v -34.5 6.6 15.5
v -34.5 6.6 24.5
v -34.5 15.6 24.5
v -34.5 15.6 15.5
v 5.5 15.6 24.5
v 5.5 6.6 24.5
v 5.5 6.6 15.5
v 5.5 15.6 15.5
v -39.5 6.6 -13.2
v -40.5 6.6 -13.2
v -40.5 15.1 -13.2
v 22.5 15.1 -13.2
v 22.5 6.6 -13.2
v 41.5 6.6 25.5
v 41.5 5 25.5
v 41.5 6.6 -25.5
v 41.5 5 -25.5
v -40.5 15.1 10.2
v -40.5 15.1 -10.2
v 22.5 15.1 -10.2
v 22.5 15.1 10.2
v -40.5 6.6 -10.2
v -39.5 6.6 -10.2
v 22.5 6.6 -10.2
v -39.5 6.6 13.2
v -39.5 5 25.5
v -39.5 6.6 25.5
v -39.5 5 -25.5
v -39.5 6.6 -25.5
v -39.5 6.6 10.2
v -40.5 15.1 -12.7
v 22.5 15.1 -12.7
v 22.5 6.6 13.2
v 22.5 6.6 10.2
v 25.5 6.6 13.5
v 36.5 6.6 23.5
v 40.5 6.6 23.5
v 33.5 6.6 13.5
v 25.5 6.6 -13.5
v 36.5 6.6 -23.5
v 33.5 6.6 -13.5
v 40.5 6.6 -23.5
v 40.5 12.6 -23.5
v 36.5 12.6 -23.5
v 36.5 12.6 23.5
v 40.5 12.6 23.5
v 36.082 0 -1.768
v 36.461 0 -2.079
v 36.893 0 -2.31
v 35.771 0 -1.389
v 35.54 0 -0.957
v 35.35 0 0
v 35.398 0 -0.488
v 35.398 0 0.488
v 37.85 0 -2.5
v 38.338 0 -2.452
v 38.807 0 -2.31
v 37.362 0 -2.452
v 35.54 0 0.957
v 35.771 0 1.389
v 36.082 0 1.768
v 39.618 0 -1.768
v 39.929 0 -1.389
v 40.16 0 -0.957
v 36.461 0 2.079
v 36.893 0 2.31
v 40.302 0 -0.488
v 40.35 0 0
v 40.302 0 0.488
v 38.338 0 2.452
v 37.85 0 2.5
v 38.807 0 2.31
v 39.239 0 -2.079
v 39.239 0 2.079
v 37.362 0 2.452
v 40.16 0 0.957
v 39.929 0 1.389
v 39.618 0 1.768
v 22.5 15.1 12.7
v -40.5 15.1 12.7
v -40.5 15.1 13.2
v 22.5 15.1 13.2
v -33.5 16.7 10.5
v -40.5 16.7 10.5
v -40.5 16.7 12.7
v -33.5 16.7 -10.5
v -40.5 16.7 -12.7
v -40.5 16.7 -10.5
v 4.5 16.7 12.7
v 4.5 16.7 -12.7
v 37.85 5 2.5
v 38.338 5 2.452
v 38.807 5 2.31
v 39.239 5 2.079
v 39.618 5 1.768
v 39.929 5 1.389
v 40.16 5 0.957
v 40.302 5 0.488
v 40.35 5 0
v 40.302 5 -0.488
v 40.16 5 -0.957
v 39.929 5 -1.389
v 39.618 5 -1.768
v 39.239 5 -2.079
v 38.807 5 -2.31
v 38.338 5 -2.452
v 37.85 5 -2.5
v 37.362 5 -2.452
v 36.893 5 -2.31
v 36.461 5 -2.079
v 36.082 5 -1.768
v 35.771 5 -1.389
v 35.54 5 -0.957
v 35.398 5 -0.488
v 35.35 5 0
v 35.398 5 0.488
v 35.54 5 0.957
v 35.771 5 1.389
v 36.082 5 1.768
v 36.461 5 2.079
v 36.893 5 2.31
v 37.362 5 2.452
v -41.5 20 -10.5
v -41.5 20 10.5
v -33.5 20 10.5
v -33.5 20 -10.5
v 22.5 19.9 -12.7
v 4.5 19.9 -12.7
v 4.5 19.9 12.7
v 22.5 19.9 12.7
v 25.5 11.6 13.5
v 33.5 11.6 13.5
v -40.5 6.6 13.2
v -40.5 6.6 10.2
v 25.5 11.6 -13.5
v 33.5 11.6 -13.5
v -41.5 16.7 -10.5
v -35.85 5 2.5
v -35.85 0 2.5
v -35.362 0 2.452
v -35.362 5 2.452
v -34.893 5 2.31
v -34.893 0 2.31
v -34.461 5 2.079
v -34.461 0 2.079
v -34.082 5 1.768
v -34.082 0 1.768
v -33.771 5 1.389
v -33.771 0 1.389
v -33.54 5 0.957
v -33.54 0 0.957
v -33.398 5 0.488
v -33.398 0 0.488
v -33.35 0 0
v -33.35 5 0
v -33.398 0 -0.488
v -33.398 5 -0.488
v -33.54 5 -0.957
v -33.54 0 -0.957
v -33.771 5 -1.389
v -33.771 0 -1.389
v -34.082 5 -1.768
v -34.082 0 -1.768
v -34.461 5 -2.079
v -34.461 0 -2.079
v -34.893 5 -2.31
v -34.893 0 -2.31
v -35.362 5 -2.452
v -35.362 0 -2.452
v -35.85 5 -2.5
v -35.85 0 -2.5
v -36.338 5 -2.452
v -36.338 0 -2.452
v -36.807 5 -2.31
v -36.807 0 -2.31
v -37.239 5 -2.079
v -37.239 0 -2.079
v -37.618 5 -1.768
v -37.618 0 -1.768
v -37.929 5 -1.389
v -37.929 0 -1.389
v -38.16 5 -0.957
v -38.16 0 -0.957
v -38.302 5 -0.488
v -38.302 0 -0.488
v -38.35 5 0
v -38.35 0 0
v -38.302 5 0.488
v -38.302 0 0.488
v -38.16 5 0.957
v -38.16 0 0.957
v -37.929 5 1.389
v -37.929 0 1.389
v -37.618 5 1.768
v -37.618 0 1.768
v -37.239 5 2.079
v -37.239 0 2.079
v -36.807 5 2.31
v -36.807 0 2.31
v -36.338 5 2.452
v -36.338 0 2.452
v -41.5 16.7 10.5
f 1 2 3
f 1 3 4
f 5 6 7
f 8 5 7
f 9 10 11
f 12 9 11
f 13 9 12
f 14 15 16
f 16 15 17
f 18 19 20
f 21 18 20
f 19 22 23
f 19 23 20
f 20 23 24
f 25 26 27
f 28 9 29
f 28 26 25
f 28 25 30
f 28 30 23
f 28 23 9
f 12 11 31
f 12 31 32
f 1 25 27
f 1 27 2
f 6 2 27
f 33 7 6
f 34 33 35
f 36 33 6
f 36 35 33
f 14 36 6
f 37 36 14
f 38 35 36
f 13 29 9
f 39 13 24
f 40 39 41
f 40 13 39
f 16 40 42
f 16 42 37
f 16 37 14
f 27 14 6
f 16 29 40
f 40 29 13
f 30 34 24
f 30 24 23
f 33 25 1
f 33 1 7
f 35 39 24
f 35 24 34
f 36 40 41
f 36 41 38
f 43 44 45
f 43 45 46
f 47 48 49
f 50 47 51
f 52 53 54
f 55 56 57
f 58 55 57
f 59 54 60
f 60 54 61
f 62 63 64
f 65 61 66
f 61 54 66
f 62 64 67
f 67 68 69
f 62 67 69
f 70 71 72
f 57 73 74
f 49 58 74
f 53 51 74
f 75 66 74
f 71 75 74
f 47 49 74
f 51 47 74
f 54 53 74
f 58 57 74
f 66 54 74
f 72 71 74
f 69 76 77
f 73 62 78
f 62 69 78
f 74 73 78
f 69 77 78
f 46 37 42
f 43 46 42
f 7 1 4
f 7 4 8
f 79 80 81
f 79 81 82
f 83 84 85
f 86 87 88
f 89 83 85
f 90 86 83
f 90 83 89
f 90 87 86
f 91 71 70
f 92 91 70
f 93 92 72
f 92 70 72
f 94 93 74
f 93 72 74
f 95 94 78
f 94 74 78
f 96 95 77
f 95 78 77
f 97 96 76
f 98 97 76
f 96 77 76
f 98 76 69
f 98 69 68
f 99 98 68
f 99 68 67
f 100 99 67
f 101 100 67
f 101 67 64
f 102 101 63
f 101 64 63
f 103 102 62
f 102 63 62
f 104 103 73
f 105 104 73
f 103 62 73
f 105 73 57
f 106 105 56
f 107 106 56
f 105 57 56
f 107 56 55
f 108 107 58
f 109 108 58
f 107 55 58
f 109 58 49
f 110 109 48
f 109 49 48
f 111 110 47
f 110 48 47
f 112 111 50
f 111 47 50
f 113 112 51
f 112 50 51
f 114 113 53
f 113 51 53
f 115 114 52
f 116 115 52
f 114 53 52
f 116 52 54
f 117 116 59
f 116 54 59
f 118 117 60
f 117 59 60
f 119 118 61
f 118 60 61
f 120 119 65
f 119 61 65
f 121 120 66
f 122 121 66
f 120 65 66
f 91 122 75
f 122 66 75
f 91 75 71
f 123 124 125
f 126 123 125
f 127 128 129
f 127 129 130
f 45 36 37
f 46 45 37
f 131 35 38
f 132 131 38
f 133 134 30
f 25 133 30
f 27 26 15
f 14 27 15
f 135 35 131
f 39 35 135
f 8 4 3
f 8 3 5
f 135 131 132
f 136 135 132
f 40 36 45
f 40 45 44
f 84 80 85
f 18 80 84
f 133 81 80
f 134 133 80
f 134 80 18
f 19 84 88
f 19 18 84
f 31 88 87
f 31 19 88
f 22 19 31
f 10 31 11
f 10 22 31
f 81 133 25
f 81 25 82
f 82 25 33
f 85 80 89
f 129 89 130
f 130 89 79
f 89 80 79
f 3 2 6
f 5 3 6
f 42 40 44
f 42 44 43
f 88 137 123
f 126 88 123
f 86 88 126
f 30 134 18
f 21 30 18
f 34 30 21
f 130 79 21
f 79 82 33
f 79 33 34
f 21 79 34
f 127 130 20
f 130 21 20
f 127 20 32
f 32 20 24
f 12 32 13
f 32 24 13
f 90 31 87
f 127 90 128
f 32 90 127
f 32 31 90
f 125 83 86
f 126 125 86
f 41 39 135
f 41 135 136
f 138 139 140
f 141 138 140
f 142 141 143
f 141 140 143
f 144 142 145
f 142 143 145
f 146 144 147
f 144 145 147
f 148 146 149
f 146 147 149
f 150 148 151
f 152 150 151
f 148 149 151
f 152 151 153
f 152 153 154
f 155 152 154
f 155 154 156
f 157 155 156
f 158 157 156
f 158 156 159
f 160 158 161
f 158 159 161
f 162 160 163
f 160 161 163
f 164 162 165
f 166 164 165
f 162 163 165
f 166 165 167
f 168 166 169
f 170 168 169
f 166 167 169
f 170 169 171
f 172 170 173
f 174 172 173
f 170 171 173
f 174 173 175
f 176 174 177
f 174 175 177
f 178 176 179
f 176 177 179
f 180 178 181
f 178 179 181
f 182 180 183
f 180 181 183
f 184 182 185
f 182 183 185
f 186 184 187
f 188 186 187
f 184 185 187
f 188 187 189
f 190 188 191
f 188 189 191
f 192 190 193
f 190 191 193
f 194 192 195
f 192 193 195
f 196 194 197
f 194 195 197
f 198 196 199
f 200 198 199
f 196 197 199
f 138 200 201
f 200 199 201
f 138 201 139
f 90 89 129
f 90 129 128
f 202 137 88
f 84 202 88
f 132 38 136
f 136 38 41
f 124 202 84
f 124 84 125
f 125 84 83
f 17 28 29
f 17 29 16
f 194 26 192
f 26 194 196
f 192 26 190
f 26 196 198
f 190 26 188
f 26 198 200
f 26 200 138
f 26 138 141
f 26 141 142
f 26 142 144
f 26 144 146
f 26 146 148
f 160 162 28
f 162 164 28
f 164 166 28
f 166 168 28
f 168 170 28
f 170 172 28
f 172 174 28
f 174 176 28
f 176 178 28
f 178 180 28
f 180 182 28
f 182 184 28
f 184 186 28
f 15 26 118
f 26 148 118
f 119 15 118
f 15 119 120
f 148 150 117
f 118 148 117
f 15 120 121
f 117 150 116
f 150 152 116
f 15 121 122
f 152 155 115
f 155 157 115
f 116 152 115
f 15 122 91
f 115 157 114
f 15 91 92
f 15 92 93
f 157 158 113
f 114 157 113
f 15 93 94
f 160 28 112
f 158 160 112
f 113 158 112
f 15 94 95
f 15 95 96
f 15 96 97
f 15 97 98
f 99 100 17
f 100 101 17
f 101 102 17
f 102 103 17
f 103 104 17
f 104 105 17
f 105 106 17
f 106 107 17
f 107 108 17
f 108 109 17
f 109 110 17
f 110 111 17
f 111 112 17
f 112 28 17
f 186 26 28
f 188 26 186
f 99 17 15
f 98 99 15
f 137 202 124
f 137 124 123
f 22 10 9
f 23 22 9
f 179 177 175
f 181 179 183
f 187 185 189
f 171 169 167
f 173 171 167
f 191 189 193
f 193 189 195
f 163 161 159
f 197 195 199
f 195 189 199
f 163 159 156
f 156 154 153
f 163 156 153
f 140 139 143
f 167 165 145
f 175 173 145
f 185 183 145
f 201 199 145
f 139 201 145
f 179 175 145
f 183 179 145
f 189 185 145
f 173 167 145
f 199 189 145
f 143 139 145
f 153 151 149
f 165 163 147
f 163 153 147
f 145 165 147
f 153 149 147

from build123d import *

# Parameters (mm, degrees)
SK_P01_STANDOFF_R                  = 2.5
P01_STANDOFF_DEPTH                 = 5
SK_P02_STANDOFF_R                  = 2.5
P02_STANDOFF_DEPTH                 = 5
P03_PERMAPROTOHALFSIZECARRIE_START = 5
SK_P03_PERMAPROTOHALFSIZECARRIE_W  = 81
SK_P03_PERMAPROTOHALFSIZECARRIE_H  = 51
P03_PERMAPROTOHALFSIZECARRIE_DEPTH = 1.6
P04_SOCKETROW_START                = 6.6
SK_P04_SOCKETROW_W                 = 63
SK_P04_SOCKETROW_H                 = 3
P04_SOCKETROW_DEPTH                = 8.5
P05_SOCKETROW_START                = 6.6
SK_P05_SOCKETROW_W                 = 63
SK_P05_SOCKETROW_H                 = 3
P05_SOCKETROW_DEPTH                = 8.5
P06_DEVKITC1_START                 = 15.1
SK_P06_DEVKITC1_W                  = 63
SK_P06_DEVKITC1_H                  = 25.4
P06_DEVKITC1_DEPTH                 = 1.6
P07_WROOM2MODULE_START             = 16.7
SK_P07_WROOM2MODULE_W              = 18
SK_P07_WROOM2MODULE_H              = 25.4
P07_WROOM2MODULE_DEPTH             = 3.2
P08_USBCX2_START                   = 16.7
SK_P08_USBCX2_W                    = 8
SK_P08_USBCX2_H                    = 21
P08_USBCX2_DEPTH                   = 3.3
P09_74LVC244_START                 = 6.6
SK_P09_74LVC244_W                  = 8
SK_P09_74LVC244_H                  = 27
P09_74LVC244_DEPTH                 = 5
P10_JSTXHHEADERSVERTICAL_START     = 6.6
SK_P10_JSTXHHEADERSVERTICAL_W      = 4
SK_P10_JSTXHHEADERSVERTICAL_H      = 47
P10_JSTXHHEADERSVERTICAL_DEPTH     = 6
P11_2X12BOXHEADERDECKSIGNALS_START = 6.6
SK_P11_2X12BOXHEADERDECKSIGNALS_W  = 40
SK_P11_2X12BOXHEADERDECKSIGNALS_H  = 9
P11_2X12BOXHEADERDECKSIGNALS_DEPTH = 9


with BuildPart() as part:
    # SK_P01_Standoff → P01_Standoff (new body)
    with BuildSketch(Plane(origin=(0, 0, 0), x_dir=(1, 0, 0), z_dir=(0, 1, 0))):
        with Locations(Location((-35.85, 0, 0), (0, 0, 270))):
            Circle(SK_P01_STANDOFF_R)
    extrude(amount=P01_STANDOFF_DEPTH)



with BuildPart() as body_2:
    # SK_P02_Standoff → P02_Standoff (new body)
    with BuildSketch(Plane(origin=(0, 0, 0), x_dir=(1, 0, 0), z_dir=(0, 1, 0))):
        with Locations(Location((37.85, 0, 0), (0, 0, 270))):
            Circle(SK_P02_STANDOFF_R)
    extrude(amount=P02_STANDOFF_DEPTH)


with BuildPart() as part_1:
    add(part.part)

    add(body_2.part)  # P03_PermaProtohalfsizecarrie merges body 2
    # SK_P03_PermaProtohalfsizecarrie → P03_PermaProtohalfsizecarrie (add)
    with BuildSketch(Plane(origin=(0, 0, 0), x_dir=(1, 0, 0), z_dir=(0, 1, 0)).offset(P03_PERMAPROTOHALFSIZECARRIE_START)):
        with Locations((1, 0)):
            Rectangle(SK_P03_PERMAPROTOHALFSIZECARRIE_W, SK_P03_PERMAPROTOHALFSIZECARRIE_H)
    extrude(amount=P03_PERMAPROTOHALFSIZECARRIE_DEPTH)

    # SK_P04_Socketrow → P04_Socketrow (add)
    with BuildSketch(Plane(origin=(0, 0, 0), x_dir=(1, 0, 0), z_dir=(0, 1, 0)).offset(P04_SOCKETROW_START)):
        with Locations((-9, 11.7)):
            Rectangle(SK_P04_SOCKETROW_W, SK_P04_SOCKETROW_H)
    extrude(amount=P04_SOCKETROW_DEPTH)

    # SK_P05_Socketrow → P05_Socketrow (add)
    with BuildSketch(Plane(origin=(0, 0, 0), x_dir=(1, 0, 0), z_dir=(0, 1, 0)).offset(P05_SOCKETROW_START)):
        with Locations((-9, -11.7)):
            Rectangle(SK_P05_SOCKETROW_W, SK_P05_SOCKETROW_H)
    extrude(amount=P05_SOCKETROW_DEPTH)

    # SK_P06_DevKitC1 → P06_DevKitC1 (add)
    with BuildSketch(Plane(origin=(0, 0, 0), x_dir=(1, 0, 0), z_dir=(0, 1, 0)).offset(P06_DEVKITC1_START)):
        with Locations((-9, 0)):
            Rectangle(SK_P06_DEVKITC1_W, SK_P06_DEVKITC1_H)
    extrude(amount=P06_DEVKITC1_DEPTH)

    # SK_P07_WROOM2module → P07_WROOM2module (add)
    with BuildSketch(Plane(origin=(0, 0, 0), x_dir=(1, 0, 0), z_dir=(0, 1, 0)).offset(P07_WROOM2MODULE_START)):
        with Locations((13.5, 0)):
            Rectangle(SK_P07_WROOM2MODULE_W, SK_P07_WROOM2MODULE_H)
    extrude(amount=P07_WROOM2MODULE_DEPTH)

    # SK_P08_USBCx2 → P08_USBCx2 (add)
    with BuildSketch(Plane(origin=(0, 0, 0), x_dir=(1, 0, 0), z_dir=(0, 1, 0)).offset(P08_USBCX2_START)):
        with Locations((-37.5, 0)):
            Rectangle(SK_P08_USBCX2_W, SK_P08_USBCX2_H)
    extrude(amount=P08_USBCX2_DEPTH)

    # SK_P09_74LVC244 → P09_74LVC244 (add)
    with BuildSketch(Plane(origin=(0, 0, 0), x_dir=(1, 0, 0), z_dir=(0, 1, 0)).offset(P09_74LVC244_START)):
        with Locations((29.5, 0)):
            Rectangle(SK_P09_74LVC244_W, SK_P09_74LVC244_H)
    extrude(amount=P09_74LVC244_DEPTH)

    # SK_P10_JSTXHheadersvertical → P10_JSTXHheadersvertical (add)
    with BuildSketch(Plane(origin=(0, 0, 0), x_dir=(1, 0, 0), z_dir=(0, 1, 0)).offset(P10_JSTXHHEADERSVERTICAL_START)):
        with Locations((38.5, 0)):
            Rectangle(SK_P10_JSTXHHEADERSVERTICAL_W, SK_P10_JSTXHHEADERSVERTICAL_H)
    extrude(amount=P10_JSTXHHEADERSVERTICAL_DEPTH)

    # SK_P11_2x12boxheaderdecksignals → P11_2x12boxheaderdecksignals (add)
    with BuildSketch(Plane(origin=(0, 0, 0), x_dir=(1, 0, 0), z_dir=(0, 1, 0)).offset(P11_2X12BOXHEADERDECKSIGNALS_START)):
        with Locations((-14.5, -20)):
            Rectangle(SK_P11_2X12BOXHEADERDECKSIGNALS_W, SK_P11_2X12BOXHEADERDECKSIGNALS_H)
    extrude(amount=P11_2X12BOXHEADERDECKSIGNALS_DEPTH)


solid = part_1.part
